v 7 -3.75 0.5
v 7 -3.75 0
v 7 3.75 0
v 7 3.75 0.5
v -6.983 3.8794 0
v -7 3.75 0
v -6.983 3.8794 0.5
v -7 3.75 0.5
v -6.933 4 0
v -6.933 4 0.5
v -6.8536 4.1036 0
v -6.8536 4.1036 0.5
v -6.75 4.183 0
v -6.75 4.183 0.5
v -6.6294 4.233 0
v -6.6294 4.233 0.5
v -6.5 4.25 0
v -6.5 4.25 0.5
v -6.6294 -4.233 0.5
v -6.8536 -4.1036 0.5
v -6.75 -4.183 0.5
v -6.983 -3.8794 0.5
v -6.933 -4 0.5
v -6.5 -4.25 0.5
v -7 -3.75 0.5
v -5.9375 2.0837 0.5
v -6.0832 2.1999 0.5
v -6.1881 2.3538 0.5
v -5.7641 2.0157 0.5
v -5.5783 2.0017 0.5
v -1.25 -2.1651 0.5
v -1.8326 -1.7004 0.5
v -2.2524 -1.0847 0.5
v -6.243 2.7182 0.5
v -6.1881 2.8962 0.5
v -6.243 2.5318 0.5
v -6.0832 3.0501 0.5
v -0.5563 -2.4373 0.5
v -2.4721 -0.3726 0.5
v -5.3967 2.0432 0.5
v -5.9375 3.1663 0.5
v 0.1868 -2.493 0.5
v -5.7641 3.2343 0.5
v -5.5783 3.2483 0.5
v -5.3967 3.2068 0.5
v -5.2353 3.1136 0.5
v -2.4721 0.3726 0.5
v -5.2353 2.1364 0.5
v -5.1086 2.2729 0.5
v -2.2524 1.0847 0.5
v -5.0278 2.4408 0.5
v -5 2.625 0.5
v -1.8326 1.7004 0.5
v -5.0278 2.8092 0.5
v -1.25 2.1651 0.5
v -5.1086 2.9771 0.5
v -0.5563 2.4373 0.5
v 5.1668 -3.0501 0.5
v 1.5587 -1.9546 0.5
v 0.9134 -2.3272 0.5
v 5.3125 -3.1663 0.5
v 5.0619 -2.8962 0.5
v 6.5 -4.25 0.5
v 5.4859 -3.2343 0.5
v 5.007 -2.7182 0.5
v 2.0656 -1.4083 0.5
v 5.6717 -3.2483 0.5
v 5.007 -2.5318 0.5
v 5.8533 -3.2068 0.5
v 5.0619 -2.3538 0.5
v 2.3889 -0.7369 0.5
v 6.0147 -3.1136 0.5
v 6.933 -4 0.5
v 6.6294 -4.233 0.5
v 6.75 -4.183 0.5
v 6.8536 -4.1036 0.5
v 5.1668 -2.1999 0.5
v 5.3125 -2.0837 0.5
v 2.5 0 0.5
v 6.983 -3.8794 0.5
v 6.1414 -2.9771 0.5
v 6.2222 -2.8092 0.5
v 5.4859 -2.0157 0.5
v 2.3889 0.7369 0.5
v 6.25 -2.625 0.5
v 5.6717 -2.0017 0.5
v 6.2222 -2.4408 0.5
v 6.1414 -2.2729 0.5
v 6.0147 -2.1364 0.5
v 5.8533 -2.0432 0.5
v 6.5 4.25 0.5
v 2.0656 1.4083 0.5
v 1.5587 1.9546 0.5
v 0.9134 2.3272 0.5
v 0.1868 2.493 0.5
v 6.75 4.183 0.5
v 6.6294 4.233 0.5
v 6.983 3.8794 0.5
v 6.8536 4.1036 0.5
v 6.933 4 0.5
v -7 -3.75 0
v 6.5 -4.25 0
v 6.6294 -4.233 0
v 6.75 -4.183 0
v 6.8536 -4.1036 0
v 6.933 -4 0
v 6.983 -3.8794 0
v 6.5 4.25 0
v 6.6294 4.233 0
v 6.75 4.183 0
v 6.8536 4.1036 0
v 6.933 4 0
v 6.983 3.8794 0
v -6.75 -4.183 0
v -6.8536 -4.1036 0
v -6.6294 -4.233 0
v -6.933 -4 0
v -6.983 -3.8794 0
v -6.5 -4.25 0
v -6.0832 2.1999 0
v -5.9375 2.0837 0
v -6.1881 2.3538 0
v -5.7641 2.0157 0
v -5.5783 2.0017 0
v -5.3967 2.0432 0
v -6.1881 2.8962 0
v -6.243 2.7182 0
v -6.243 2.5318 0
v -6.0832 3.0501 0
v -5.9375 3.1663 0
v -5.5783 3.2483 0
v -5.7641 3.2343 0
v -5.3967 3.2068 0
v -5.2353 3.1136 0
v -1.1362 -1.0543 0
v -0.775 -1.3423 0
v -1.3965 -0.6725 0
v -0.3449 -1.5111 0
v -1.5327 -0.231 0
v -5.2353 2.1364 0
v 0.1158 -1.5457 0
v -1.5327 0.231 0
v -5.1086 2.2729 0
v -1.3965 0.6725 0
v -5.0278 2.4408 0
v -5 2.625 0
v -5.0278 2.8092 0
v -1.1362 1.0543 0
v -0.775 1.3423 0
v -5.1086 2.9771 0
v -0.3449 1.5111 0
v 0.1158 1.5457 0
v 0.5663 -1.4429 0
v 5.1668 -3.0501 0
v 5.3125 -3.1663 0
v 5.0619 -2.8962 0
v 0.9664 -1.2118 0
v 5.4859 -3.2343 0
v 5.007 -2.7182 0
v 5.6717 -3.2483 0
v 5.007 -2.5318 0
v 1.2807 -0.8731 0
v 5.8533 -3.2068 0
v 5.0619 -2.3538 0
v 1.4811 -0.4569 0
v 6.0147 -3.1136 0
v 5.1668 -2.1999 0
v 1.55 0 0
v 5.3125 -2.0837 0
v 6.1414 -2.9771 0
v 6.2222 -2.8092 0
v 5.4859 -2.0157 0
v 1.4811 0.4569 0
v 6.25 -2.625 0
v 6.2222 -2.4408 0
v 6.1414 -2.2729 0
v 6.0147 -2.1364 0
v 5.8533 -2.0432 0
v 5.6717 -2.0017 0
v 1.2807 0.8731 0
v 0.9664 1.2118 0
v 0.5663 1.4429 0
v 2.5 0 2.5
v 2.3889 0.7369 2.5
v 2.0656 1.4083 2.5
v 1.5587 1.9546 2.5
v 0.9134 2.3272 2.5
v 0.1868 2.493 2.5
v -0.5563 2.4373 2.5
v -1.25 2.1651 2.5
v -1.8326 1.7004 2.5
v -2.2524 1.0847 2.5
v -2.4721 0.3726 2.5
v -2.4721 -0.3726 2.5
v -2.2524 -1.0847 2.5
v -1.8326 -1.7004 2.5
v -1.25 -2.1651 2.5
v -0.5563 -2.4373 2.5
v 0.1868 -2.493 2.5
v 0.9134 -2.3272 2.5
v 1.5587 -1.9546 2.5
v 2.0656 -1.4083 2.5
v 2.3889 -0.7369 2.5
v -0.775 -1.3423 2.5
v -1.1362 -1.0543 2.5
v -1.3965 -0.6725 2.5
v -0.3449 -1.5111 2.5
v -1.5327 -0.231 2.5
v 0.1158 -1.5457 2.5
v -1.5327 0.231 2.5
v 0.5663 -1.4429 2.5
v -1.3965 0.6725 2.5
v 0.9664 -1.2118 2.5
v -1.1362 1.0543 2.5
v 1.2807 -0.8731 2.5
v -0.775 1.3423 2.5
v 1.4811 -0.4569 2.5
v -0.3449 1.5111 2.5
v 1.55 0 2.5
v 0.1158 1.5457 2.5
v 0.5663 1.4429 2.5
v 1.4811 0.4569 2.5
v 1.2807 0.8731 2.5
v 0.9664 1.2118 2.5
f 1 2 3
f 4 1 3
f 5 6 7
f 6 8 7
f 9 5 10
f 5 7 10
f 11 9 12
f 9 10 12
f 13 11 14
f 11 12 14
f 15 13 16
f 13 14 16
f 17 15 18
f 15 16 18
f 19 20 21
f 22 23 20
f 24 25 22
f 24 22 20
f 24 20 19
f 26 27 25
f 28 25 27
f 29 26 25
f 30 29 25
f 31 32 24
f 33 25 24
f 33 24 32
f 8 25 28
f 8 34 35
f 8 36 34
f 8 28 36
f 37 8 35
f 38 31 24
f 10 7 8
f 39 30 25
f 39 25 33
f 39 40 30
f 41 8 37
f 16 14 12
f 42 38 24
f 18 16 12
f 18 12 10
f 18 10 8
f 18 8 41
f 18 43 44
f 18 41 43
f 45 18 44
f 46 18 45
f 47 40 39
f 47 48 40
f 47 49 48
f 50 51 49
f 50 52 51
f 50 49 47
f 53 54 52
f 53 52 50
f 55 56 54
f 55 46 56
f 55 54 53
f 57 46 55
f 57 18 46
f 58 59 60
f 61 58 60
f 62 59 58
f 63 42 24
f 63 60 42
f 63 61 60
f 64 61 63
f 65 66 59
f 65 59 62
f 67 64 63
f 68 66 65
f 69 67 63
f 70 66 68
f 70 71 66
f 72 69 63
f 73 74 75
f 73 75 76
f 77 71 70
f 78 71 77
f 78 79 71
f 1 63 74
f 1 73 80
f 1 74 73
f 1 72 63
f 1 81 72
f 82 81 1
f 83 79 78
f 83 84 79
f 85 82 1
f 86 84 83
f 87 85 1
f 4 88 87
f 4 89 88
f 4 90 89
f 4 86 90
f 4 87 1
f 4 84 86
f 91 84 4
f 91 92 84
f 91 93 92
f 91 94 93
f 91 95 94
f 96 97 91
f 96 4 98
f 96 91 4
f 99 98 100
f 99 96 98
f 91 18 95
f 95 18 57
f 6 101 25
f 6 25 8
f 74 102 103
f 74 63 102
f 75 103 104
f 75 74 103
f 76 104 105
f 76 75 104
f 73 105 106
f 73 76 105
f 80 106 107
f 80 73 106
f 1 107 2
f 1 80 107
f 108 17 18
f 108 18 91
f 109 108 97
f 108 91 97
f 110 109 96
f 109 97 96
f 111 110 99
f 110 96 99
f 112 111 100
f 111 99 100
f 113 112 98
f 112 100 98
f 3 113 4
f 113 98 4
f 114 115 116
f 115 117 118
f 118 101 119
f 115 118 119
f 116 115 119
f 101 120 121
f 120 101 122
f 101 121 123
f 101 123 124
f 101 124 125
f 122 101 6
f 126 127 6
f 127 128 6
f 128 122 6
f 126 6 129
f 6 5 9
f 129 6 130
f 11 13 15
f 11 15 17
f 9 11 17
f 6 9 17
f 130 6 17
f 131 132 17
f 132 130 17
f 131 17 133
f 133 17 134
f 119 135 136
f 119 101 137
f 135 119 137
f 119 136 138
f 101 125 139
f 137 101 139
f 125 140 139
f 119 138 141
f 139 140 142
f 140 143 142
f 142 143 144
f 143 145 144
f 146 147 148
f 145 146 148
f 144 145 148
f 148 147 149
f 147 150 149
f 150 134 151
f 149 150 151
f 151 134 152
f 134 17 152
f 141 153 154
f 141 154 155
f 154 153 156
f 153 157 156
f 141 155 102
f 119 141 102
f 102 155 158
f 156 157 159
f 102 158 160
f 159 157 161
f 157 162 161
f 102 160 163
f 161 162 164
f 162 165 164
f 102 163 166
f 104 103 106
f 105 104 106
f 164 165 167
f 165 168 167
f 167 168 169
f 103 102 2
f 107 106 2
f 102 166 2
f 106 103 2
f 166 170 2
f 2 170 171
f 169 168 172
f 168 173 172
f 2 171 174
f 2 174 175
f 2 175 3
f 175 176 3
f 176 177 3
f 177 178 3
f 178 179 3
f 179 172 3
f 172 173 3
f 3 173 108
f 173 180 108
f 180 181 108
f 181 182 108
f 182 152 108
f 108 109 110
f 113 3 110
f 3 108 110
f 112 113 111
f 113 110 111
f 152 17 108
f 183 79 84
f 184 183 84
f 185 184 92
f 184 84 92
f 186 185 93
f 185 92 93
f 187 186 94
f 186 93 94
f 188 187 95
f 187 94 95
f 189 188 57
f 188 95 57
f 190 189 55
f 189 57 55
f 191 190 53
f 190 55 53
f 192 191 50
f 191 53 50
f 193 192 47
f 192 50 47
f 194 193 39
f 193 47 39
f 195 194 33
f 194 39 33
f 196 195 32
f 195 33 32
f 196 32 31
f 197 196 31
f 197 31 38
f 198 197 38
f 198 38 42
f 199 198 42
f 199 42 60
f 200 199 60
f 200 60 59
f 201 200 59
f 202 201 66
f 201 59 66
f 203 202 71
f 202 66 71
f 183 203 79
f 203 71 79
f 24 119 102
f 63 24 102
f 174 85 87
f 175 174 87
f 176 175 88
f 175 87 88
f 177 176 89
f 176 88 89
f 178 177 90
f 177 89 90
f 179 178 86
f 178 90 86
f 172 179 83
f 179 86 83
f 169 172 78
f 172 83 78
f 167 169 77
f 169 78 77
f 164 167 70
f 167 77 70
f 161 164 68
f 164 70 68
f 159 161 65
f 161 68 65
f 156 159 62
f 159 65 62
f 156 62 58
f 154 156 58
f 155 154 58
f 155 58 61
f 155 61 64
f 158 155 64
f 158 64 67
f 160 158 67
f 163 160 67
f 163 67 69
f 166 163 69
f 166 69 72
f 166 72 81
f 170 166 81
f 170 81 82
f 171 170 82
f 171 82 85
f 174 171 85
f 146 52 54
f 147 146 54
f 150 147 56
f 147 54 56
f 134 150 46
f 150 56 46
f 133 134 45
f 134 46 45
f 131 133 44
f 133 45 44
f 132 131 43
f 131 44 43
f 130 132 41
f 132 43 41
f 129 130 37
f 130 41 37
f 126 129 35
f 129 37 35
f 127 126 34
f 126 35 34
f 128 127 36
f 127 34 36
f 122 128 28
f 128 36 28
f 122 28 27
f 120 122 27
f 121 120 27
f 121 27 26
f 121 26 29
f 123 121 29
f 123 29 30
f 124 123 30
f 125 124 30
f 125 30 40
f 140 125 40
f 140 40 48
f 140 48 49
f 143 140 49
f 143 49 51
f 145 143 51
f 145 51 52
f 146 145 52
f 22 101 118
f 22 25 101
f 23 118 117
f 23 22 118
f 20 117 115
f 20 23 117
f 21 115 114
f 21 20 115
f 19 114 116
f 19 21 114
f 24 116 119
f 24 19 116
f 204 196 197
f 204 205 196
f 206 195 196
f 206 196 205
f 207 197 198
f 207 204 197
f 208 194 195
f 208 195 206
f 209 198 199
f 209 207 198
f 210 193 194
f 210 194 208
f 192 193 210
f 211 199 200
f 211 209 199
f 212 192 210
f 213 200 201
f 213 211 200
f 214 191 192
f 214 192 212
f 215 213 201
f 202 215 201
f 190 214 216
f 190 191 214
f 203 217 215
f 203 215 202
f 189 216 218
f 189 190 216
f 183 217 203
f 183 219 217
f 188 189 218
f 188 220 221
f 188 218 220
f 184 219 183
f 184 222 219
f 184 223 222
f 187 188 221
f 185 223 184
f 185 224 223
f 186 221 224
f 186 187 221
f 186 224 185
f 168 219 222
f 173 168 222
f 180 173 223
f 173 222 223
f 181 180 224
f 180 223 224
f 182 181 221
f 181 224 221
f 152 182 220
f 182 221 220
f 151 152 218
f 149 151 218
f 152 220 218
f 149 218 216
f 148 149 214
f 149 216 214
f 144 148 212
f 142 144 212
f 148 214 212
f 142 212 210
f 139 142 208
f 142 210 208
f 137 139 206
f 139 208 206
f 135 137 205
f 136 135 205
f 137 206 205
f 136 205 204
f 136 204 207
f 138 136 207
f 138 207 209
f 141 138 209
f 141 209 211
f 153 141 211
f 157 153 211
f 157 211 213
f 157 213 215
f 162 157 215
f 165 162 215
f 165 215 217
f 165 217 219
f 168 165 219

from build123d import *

# Parameters (mm, degrees)
SKETCH_W        = 14
SKETCH_H        = 8.5
PAD_DEPTH       = 0.5
SKETCH001_R     = 0.625
POCKET_DEPTH    = 0.501
SKETCH002_R     = 2.5
PAD001_DEPTH    = 2
SKETCH003_R     = 1.55
POCKET001_DEPTH = 2.501
FILLET_R        = 0.5


with BuildPart() as part:
    # Sketch → Pad (new body)
    with BuildSketch(Plane.XY):
        Rectangle(SKETCH_W, SKETCH_H)
    extrude(amount=PAD_DEPTH)

    # Sketch001 (on Face6 of Pad) → Pocket (cut, through all)
    with BuildSketch(Plane.XY.offset(0.5)):
        with Locations((-5.625, 2.625)):
            Circle(SKETCH001_R)
        with Locations((5.625, -2.625)):
            Circle(SKETCH001_R)
    extrude(amount=-POCKET_DEPTH, mode=Mode.SUBTRACT)

    # Sketch002 (on Face5 of Pocket) → Pad001 (join)
    with BuildSketch(Plane.XY.offset(0.5)):
        Circle(SKETCH002_R)
    extrude(amount=PAD001_DEPTH)

    # Sketch003 (on Face10 of Pad001) → Pocket001 (cut, through all)
    with BuildSketch(Plane.XY.offset(2.5)):
        Circle(SKETCH003_R)
    extrude(amount=-POCKET001_DEPTH, mode=Mode.SUBTRACT)

    # Fillet
    fillet_edges = [part.edges().sort_by_distance(p)[0] for p in [
        (-7, -4.25, 0.25),
        (7, -4.25, 0.25),
        (7, 4.25, 0.25),
        (-7, 4.25, 0.25),
    ]]
    fillet(fillet_edges, radius=FILLET_R)


solid = part.part
